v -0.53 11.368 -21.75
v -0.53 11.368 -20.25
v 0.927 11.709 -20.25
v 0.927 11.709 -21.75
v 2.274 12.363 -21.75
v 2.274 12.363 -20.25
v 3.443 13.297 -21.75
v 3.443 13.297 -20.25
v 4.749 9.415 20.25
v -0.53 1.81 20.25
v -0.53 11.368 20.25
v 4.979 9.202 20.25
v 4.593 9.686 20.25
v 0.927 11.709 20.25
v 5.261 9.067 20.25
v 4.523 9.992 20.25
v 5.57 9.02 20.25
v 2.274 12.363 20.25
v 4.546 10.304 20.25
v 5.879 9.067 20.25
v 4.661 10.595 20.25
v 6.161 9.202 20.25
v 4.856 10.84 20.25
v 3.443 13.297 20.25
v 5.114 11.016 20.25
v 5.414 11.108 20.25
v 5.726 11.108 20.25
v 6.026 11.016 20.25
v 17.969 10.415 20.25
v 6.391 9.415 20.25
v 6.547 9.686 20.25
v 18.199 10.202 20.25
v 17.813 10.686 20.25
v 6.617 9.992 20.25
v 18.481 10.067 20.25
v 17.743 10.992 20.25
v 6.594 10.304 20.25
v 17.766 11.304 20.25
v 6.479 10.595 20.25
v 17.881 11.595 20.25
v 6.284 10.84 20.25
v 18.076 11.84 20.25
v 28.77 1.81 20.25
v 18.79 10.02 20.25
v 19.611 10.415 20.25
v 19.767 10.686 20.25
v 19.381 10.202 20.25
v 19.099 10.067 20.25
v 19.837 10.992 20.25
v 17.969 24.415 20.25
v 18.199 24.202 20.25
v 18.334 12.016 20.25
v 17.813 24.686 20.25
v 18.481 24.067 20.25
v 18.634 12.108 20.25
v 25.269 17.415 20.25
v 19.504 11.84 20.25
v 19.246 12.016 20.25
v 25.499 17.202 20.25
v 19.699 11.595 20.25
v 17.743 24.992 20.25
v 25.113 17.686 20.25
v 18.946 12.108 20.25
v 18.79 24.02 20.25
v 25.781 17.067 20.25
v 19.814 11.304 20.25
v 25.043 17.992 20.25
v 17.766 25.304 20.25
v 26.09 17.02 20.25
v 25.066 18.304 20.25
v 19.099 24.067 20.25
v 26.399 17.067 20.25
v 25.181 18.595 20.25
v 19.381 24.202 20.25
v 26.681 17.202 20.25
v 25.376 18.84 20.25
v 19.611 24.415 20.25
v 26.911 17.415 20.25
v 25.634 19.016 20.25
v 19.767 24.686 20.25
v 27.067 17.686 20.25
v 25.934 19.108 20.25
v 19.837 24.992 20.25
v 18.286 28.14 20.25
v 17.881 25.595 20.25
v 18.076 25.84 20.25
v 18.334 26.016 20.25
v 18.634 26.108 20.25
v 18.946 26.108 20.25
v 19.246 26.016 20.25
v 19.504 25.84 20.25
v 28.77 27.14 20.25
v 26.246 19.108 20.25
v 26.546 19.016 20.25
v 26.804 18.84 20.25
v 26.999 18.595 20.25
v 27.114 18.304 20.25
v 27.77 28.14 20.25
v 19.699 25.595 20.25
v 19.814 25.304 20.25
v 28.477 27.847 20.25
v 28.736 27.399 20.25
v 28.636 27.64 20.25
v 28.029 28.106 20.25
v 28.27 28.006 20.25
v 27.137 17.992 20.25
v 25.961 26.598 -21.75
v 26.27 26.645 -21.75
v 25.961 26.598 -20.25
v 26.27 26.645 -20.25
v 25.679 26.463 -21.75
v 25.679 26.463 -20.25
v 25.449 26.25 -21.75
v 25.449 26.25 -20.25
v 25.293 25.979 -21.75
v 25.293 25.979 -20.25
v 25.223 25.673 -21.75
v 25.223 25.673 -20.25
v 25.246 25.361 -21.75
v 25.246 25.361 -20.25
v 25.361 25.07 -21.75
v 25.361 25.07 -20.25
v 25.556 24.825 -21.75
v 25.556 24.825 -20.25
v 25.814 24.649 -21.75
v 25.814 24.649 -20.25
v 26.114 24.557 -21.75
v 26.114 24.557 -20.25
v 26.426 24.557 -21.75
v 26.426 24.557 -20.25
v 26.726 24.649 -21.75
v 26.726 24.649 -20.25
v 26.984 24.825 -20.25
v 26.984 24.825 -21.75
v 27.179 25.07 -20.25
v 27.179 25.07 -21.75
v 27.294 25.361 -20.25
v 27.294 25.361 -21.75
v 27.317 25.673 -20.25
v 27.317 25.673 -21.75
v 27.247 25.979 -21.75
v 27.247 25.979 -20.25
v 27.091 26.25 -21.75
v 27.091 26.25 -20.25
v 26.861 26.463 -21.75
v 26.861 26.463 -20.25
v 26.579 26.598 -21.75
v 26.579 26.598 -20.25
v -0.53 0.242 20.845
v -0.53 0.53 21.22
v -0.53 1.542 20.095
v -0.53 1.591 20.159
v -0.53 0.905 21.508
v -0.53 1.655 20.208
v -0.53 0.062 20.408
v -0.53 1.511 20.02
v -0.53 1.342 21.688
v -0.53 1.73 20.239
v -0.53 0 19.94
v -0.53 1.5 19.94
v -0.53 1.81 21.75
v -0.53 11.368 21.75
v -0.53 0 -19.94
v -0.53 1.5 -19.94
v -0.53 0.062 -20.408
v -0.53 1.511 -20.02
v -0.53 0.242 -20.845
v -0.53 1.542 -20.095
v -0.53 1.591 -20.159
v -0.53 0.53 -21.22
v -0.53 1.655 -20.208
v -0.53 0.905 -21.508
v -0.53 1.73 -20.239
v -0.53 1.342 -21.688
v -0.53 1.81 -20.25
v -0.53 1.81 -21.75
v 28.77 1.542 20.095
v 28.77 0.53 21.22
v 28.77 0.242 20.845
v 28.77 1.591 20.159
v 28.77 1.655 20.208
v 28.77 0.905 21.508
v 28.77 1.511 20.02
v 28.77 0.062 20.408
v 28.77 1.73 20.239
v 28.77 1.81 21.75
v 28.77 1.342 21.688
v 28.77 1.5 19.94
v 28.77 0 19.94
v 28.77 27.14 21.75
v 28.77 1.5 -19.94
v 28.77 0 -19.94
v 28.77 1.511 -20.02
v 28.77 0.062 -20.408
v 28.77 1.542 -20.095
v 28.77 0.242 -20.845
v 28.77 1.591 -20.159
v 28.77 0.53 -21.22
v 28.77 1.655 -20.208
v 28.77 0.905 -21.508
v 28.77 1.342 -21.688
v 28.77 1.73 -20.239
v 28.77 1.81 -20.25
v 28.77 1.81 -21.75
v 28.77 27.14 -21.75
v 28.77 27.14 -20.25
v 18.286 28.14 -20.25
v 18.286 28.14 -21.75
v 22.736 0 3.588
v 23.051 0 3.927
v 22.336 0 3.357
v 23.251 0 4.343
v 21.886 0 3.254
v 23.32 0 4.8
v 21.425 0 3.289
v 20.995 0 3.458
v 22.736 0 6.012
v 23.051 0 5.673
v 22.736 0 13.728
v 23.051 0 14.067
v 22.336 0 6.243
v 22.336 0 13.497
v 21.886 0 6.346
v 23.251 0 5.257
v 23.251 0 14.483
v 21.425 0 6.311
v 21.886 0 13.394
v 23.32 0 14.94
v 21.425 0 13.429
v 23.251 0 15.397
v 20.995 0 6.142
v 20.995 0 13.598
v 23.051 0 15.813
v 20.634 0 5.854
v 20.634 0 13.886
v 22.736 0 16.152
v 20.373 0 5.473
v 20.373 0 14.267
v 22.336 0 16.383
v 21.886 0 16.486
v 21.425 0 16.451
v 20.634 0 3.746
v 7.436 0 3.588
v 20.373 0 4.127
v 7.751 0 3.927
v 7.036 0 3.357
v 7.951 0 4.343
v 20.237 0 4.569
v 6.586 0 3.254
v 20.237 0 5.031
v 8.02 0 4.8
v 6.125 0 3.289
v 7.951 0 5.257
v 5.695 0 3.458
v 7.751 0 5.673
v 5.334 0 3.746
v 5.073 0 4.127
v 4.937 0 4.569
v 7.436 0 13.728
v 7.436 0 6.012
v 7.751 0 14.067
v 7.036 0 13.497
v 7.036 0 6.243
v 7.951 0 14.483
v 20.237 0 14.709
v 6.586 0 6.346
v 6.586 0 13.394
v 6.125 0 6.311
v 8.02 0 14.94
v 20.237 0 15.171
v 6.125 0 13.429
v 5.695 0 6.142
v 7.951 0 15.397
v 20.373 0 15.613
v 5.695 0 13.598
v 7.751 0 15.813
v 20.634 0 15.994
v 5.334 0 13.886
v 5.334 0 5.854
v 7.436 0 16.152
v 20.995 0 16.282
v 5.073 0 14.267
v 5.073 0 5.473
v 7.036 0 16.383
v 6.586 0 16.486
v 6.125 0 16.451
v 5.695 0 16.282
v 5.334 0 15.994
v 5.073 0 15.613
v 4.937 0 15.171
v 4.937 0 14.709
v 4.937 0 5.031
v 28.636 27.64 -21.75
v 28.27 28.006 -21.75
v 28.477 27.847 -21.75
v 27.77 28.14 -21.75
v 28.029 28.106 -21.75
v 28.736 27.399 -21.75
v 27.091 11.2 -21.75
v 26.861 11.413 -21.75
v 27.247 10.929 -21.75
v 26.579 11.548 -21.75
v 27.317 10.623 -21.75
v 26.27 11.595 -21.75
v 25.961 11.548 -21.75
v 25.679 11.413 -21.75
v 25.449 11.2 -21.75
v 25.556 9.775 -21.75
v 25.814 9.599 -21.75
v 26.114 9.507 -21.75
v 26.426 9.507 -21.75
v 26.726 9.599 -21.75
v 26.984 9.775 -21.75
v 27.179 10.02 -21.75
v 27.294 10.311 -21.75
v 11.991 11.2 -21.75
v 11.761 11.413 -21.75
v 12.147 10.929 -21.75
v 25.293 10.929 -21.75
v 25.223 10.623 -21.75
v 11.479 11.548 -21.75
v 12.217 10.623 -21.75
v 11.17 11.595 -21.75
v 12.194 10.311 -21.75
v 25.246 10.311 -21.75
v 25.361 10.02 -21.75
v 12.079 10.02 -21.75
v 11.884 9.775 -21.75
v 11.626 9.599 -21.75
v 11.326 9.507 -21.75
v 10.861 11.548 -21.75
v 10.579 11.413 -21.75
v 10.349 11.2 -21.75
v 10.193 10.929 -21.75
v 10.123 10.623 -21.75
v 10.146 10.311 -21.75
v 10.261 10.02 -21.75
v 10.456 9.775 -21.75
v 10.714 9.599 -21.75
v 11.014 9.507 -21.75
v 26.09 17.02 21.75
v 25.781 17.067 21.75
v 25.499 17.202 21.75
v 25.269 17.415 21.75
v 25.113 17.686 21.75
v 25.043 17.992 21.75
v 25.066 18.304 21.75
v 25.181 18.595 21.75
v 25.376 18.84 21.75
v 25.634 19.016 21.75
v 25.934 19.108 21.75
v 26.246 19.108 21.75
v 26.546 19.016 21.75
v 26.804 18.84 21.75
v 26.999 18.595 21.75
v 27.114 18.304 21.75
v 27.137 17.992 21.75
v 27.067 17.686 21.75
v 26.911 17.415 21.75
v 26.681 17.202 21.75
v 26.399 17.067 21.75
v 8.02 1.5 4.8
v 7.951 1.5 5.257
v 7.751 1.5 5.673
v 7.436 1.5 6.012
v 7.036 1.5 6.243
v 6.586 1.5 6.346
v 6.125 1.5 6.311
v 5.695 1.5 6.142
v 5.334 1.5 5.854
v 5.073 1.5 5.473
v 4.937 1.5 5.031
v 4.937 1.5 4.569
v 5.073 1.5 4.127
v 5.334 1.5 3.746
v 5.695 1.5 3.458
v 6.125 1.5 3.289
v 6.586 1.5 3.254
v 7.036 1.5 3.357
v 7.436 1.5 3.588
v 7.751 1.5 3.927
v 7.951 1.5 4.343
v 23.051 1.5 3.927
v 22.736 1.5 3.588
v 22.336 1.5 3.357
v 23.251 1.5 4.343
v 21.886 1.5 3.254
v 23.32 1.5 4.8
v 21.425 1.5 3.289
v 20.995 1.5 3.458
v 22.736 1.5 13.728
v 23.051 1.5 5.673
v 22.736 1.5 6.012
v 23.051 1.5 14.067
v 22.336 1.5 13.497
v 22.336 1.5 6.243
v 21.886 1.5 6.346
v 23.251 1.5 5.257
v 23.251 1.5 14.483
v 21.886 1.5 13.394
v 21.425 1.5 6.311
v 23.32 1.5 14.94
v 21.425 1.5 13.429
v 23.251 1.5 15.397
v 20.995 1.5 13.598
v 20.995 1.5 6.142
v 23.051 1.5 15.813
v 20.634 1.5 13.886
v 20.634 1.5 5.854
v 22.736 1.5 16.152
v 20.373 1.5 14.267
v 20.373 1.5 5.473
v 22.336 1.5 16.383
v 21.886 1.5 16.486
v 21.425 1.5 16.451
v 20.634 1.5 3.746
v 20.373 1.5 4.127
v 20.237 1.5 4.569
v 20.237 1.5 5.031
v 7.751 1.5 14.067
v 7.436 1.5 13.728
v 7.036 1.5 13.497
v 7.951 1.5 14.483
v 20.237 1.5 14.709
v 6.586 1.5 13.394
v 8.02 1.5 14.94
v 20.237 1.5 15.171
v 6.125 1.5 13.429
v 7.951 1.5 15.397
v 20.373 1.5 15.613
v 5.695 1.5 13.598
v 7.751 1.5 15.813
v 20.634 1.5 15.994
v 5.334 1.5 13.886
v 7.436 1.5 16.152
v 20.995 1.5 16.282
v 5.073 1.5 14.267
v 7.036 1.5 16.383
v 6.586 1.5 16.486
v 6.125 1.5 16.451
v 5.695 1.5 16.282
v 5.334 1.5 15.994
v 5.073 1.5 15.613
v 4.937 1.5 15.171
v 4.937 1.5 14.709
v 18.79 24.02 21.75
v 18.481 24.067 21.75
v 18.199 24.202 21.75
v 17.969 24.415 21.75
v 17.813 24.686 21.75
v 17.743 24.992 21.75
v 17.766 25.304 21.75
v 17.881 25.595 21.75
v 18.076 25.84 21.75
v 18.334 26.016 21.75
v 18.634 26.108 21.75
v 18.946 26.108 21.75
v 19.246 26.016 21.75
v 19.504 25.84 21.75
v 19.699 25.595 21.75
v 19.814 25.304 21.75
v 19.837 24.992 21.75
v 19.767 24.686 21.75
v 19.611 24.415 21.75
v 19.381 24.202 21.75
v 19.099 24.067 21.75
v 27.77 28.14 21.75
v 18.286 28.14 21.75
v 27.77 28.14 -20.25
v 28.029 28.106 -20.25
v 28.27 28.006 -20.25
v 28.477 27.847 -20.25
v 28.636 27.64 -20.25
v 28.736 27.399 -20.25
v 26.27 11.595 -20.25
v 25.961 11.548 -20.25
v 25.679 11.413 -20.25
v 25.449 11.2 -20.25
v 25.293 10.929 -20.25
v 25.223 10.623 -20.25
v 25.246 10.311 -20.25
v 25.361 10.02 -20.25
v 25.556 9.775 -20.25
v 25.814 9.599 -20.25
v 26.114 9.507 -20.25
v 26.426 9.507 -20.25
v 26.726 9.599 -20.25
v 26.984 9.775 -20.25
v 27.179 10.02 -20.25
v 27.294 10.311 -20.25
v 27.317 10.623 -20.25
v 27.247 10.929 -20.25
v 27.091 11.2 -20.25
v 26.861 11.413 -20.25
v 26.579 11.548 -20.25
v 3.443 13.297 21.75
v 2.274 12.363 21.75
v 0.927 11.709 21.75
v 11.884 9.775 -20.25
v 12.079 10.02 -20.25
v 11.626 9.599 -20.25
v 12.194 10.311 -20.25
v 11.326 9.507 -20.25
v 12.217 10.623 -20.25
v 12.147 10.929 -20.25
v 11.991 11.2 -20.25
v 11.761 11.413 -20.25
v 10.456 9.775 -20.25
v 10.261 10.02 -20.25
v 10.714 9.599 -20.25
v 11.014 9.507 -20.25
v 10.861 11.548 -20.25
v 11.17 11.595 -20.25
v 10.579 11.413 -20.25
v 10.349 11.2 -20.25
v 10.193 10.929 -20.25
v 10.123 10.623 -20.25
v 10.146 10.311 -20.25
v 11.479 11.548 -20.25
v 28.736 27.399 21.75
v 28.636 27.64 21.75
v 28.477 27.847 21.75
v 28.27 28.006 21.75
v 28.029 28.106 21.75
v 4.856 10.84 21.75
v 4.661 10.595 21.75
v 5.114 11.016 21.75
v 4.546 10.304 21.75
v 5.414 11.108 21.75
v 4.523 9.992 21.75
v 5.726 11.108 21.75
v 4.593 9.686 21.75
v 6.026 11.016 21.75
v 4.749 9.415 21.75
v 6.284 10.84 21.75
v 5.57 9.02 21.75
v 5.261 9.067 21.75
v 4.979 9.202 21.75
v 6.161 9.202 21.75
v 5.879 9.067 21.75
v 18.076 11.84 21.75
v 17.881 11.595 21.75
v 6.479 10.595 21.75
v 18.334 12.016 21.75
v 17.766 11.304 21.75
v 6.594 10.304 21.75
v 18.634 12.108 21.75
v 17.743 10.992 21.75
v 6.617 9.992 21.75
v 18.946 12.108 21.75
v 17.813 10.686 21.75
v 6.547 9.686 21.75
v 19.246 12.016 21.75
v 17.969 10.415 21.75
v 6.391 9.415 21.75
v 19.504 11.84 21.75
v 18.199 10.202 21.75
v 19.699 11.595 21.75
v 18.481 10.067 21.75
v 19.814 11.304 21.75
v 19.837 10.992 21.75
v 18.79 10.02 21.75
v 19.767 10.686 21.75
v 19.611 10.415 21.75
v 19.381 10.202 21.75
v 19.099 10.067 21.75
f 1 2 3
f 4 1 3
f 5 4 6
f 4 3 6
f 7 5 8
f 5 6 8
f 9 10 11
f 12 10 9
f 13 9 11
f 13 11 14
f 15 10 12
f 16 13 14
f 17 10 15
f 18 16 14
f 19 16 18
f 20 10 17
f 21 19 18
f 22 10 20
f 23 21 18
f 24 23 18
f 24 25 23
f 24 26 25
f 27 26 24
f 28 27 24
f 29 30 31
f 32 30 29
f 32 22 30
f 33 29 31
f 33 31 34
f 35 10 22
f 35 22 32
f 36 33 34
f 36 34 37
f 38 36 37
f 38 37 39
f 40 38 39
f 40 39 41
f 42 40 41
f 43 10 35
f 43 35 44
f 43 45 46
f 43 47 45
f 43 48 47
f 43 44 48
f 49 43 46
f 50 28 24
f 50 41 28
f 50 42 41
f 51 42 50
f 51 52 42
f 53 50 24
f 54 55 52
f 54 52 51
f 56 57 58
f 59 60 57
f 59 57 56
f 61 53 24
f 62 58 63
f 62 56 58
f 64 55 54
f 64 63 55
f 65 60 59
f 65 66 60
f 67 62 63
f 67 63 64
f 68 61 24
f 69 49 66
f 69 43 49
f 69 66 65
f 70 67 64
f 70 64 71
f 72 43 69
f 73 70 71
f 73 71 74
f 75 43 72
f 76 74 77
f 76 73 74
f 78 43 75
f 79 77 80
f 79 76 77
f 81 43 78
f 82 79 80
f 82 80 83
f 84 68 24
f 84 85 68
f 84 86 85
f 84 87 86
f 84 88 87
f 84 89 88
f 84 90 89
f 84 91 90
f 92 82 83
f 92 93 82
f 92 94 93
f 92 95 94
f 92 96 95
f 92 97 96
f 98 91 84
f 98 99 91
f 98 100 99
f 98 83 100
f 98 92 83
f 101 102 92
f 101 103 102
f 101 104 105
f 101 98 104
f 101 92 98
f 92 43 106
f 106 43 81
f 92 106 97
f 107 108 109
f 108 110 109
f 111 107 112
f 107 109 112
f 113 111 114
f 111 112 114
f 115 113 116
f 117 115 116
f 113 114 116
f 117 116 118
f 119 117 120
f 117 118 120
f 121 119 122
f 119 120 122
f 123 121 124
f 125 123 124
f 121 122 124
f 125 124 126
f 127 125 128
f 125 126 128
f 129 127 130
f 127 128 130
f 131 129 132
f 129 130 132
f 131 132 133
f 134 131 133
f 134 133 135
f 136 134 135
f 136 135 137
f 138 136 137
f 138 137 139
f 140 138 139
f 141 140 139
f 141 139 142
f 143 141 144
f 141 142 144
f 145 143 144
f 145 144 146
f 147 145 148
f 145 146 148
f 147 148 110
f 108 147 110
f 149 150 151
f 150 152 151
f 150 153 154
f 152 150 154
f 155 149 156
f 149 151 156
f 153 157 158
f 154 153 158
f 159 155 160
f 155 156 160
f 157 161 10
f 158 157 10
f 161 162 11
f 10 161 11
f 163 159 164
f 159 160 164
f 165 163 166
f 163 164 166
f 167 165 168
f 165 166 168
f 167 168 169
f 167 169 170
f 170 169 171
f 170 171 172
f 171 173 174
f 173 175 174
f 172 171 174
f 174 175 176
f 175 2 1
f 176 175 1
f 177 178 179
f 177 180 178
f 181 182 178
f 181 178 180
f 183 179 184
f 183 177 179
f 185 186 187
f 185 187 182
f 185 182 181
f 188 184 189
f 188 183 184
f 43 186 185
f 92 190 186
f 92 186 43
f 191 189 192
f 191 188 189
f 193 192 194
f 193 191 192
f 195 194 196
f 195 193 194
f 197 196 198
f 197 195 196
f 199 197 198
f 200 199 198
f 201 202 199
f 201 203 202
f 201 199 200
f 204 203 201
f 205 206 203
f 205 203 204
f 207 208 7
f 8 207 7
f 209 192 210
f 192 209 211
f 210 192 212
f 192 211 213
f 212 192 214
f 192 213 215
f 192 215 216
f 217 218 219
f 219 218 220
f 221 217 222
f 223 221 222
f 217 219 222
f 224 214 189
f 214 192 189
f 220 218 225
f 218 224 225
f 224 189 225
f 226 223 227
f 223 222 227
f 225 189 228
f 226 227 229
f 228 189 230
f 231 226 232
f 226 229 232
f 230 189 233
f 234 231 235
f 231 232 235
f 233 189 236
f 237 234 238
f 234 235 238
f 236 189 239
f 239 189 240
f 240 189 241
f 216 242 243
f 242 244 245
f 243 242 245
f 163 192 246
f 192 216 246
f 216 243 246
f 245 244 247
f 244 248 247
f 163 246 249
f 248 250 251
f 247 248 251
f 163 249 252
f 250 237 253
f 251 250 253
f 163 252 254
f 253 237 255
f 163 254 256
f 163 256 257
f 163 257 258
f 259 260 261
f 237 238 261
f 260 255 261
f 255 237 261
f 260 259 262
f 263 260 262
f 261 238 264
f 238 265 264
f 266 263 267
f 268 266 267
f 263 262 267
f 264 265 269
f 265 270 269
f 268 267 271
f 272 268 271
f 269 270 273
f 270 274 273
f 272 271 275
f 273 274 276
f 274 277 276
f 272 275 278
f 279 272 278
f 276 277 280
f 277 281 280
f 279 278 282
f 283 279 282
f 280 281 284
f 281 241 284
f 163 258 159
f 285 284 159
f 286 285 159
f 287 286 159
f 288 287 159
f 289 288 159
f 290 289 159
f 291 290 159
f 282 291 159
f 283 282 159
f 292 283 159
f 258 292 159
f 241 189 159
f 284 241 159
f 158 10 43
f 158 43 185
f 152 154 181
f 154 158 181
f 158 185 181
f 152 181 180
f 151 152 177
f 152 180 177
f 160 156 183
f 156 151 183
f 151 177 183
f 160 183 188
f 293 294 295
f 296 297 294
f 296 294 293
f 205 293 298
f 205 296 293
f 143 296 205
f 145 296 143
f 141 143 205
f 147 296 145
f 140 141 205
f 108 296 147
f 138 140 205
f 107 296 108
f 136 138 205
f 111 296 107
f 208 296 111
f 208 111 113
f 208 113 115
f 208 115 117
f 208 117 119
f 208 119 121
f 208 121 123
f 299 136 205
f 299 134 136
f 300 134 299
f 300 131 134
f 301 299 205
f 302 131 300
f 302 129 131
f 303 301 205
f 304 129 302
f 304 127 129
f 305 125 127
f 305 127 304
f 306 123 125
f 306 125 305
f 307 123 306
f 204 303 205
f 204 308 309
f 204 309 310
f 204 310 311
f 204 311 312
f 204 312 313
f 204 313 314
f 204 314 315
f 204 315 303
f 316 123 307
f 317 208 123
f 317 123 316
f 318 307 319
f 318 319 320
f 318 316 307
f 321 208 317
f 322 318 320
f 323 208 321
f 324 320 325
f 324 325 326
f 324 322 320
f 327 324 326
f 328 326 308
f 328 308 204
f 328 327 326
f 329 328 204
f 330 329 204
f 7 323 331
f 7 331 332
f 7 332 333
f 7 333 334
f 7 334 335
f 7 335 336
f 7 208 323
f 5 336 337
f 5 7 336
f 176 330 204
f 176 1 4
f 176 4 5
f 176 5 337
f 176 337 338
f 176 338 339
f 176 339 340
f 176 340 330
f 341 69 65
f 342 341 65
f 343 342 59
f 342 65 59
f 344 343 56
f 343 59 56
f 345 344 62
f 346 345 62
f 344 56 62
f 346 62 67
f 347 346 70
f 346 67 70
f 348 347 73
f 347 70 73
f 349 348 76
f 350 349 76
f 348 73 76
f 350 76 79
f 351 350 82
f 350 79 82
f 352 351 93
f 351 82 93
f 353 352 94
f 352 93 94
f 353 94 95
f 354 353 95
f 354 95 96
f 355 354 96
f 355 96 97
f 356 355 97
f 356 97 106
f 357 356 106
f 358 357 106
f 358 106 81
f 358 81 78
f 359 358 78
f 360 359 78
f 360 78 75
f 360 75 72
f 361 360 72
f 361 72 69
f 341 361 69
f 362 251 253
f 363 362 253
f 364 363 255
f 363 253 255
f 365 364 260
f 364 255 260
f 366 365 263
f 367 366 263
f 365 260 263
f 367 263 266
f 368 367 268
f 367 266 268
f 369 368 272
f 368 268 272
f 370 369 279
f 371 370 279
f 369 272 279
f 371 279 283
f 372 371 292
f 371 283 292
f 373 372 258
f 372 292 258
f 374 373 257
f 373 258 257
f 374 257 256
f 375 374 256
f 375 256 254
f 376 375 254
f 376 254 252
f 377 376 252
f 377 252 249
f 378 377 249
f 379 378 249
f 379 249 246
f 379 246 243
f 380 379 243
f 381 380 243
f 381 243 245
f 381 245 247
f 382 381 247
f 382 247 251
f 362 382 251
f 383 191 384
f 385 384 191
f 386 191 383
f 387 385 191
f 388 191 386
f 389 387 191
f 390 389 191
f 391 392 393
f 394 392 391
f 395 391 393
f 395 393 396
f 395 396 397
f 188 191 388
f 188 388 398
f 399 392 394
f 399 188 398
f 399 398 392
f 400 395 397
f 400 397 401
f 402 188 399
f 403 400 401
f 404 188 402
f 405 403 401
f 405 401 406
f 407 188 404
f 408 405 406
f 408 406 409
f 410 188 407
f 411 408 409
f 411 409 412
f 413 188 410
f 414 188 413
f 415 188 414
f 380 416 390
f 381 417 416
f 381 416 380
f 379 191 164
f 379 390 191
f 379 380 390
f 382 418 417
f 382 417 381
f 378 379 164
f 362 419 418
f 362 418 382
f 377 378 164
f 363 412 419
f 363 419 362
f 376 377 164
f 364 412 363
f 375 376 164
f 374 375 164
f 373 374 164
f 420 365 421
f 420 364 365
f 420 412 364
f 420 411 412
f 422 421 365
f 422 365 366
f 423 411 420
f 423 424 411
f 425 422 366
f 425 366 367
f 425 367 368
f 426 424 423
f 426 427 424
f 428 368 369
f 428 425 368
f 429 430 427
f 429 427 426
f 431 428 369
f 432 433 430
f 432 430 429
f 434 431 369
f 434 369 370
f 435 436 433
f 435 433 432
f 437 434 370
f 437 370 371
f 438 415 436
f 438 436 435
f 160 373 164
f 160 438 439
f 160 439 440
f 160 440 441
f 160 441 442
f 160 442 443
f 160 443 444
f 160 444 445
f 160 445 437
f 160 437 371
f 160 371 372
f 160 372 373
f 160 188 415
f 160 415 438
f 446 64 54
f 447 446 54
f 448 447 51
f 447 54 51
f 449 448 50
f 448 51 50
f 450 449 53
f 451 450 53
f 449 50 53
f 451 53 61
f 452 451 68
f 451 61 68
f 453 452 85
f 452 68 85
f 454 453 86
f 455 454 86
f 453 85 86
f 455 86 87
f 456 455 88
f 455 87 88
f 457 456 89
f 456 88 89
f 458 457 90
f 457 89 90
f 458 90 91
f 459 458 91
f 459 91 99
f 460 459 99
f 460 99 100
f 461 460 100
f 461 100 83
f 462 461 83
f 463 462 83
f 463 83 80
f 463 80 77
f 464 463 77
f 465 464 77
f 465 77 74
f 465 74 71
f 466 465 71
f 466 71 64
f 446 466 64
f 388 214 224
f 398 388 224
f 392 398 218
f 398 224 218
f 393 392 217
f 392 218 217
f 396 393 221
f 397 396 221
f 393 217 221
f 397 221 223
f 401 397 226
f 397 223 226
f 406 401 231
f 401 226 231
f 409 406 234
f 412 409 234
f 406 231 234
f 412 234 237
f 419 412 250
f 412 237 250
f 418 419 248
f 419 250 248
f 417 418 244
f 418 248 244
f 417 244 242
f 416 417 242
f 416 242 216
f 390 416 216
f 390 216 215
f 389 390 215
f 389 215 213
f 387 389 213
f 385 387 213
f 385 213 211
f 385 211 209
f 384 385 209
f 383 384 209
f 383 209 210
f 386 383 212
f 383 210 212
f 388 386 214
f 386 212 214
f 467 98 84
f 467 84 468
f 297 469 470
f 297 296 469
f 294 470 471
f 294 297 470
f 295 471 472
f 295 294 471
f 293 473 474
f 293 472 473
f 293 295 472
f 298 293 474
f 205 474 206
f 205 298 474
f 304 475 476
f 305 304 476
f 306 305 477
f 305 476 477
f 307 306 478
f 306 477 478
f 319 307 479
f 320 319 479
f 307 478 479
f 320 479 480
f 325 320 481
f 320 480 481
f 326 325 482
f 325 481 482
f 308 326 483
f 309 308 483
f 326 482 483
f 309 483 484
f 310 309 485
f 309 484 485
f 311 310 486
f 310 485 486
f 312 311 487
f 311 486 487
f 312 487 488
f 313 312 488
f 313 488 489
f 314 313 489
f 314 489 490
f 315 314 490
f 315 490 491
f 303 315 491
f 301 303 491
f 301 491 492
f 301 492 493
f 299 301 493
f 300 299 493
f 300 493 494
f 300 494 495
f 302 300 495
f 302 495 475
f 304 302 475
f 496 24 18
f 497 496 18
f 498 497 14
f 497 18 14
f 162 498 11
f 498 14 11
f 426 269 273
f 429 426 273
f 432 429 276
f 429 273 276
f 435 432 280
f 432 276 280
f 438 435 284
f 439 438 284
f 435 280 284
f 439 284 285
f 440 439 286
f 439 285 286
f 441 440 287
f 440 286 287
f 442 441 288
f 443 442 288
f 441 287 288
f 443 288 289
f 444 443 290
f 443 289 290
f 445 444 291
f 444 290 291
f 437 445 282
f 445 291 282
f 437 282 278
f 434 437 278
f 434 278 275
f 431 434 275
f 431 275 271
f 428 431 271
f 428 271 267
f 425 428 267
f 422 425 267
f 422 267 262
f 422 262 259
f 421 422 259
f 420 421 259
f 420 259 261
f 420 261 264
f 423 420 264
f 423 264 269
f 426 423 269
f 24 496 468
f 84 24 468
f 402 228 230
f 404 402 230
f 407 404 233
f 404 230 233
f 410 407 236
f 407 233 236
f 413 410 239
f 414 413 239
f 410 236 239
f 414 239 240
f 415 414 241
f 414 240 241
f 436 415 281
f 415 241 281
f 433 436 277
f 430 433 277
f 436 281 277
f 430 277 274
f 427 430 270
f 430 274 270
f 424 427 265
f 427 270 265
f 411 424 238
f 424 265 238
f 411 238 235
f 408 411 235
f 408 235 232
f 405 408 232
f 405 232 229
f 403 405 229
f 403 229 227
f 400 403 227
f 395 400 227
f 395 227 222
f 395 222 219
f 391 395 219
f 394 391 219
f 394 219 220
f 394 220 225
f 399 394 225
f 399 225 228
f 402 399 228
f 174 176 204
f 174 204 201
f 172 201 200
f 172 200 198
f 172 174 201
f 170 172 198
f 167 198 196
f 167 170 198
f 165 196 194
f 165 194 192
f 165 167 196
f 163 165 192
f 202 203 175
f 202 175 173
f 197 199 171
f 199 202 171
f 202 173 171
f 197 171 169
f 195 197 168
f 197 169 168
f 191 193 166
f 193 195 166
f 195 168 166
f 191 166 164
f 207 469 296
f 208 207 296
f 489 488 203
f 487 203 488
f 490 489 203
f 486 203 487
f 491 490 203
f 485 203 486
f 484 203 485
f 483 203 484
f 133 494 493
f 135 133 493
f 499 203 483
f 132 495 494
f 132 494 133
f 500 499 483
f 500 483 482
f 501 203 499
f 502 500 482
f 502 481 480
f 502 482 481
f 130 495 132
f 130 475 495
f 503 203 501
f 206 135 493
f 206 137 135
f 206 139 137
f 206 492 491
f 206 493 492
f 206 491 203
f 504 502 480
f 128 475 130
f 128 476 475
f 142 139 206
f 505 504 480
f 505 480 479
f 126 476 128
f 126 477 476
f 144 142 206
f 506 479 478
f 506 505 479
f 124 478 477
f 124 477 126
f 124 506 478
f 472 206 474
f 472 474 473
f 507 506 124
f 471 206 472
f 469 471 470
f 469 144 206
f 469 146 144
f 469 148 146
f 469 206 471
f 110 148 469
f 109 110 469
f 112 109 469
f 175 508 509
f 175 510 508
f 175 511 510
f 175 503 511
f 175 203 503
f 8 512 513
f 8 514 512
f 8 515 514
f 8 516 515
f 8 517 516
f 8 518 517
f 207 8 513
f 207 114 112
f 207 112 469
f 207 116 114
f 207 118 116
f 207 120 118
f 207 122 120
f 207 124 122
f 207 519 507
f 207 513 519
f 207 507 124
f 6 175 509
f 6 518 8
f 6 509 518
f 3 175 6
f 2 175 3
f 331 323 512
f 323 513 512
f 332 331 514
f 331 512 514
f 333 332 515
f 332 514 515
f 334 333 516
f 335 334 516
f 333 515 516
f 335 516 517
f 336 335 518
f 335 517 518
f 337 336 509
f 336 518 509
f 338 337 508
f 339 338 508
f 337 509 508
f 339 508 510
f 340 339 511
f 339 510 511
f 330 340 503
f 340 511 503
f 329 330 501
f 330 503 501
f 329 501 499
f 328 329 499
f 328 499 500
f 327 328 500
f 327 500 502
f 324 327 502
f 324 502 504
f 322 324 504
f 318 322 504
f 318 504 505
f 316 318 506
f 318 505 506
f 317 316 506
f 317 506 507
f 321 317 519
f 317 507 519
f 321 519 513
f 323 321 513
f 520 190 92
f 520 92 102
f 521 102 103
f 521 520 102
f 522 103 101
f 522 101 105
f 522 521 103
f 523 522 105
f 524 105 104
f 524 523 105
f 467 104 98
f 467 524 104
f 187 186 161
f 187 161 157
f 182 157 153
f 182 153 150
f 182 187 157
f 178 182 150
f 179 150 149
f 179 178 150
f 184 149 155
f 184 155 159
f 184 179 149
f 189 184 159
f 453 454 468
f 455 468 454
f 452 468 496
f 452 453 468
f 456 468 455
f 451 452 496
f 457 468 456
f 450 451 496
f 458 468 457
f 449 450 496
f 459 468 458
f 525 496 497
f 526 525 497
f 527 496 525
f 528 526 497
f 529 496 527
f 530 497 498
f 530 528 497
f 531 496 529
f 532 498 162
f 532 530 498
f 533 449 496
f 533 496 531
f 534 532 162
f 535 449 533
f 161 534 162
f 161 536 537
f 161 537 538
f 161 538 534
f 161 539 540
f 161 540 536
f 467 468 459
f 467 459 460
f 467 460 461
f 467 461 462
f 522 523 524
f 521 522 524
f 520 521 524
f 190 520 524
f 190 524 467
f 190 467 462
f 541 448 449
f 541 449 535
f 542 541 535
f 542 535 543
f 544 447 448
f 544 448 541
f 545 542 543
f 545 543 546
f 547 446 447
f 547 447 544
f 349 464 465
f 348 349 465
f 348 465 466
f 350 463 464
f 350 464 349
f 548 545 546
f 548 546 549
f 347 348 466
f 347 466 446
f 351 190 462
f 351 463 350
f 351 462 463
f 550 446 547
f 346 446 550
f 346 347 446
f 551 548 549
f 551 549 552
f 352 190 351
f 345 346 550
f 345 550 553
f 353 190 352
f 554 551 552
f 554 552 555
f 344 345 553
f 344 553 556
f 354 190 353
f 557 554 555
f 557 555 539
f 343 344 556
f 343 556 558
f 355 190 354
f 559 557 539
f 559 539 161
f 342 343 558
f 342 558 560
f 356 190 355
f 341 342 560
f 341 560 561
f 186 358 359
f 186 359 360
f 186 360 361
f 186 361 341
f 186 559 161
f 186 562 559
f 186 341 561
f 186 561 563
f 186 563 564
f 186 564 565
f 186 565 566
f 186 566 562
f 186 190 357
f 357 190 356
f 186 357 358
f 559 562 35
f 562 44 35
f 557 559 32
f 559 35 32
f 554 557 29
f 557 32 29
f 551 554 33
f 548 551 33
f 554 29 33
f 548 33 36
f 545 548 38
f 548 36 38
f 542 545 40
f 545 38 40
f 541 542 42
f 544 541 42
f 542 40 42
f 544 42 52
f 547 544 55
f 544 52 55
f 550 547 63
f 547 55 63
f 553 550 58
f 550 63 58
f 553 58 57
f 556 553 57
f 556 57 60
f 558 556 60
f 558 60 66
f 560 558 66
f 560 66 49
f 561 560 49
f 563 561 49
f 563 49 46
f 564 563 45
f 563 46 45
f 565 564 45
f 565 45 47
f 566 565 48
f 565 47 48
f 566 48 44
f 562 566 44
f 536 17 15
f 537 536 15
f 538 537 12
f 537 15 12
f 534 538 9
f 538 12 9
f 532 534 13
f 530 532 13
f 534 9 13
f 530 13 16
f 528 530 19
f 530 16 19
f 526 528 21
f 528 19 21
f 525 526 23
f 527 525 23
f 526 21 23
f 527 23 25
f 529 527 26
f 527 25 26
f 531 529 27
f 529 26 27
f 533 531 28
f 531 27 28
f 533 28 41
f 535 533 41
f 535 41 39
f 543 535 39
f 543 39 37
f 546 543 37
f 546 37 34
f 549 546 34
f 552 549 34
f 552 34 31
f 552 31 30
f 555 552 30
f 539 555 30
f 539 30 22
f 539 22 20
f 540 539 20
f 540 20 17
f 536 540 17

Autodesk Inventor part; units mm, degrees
ref_plane "YZ Plane" through (0, 0, 0) normal (1, 0, 0) x (0, 1, 0)
ref_plane "XZ Plane" through (0, 0, 0) normal (0, 1, 0) x (-1, 0, 0)
ref_plane "XY Plane" through (0, 0, 0) normal (0, 0, 1) x (1, 0, 0)
sketch "Sketch1" plane through (0, 0, 0) normal (0, 1, 0) x (-1, 0, 0)
  line L0 (0.53, 20.25) -> (-28.77, 20.25)
  line L1 (-28.77, 20.25) -> (-28.77, -20.25)
  line L2 (-28.77, -20.25) -> (0.53, -20.25)
  line L3 (0.53, -20.25) -> (0.53, 20.25)
  point P0 (0, 0)
  dimension "d0" = 40.5
  dimension "d1" = 29.3
  dimension "d2" = -0.53
  dimension "d3" = 20.25
extrude "Plate1" add sketch "Sketch1" along normal blind 1.5
sketch "Sketch2" plane through (28.77, 0, 21.75) normal (0, 0, -1) x (-1, 0, 0)
  line L0 (29.3, 0) -> (0, 0)
  line L1 (0, 0) -> (0, 28.14)
  line L2 (0, 28.14) -> (29.3, 28.14)
  line L3 (29.3, 28.14) -> (29.3, 0)
edge flange "Flange1" height 28.14 angle 90 thickness 1.5 bend radius 0.31 thickness toward (0, 0, -1) relief tear relief width 1.5 relief depth 0.75 corner gap 0.31 corner form 0 edges at (14.12, 1.5, 20.25) (14.12, 1.5, -20.25) wall of the first edge with corners at (-0.53, 0, 21.75) (28.77, 0, 21.75) (28.77, 28.14, 21.75) (-0.53, 28.14, 21.75)
bend "Bend1"
corner "Corner1"
sketch "Sketch6" plane through (-0.53, 28.14, 21.75) normal (0, 0, 1) x (1, 0, 0)
  point P0 (0.53, -28.14)
sketch "Sketch8" plane through (28.77, 28.14, -21.75) normal (0, 0, -1) x (-1, 0, 0)
  circle A0 centre (2.5, -2.545) radius 0.7835
  circle A1 centre (2.5, -17.595) radius 0.7835
  circle A2 centre (17.6, -2.545) radius 0.7835
  circle A3 centre (17.6, -17.595) radius 0.7835
  circle A4 centre (37.6, -2.545) radius 0.7835
  circle A5 centre (37.6, -17.595) radius 0.7835
  point P0 (28.77, -28.14)
hole "Hole4" at (26.27, 25.595, -21.75) at (26.27, 10.545, -21.75) at (11.17, 25.595, -21.75) at (11.17, 10.545, -21.75) at (-8.83, 25.595, -21.75) at (-8.83, 10.545, -21.75) direction (0, 0, 1) diameter 2.1 depth 1.5
sketch "Sketch9" plane through (28.77, 28.14, -21.75) normal (0, 0, -1) x (-1, 0, 0)
  circle A0 centre (30.1, -10.07) radius 6
  point P0 (28.77, -28.14)
sketch "Sketch10" plane through (-0.53, 28.14, 21.75) normal (0, 0, 1) x (1, 0, 0)
  point P0 (0.53, -28.14)
sketch "Sketch11" plane through (-0.53, 28.14, 21.75) normal (0, 0, 1) x (1, 0, 0)
  point P0 (0.53, -28.14)
sketch "Sketch15" plane through (0, 0, 0) normal (0, -1, 0) x (1, 0, 0)
  point P0 (0, 0)
sketch "Sketch16" plane through (0, 0, 0) normal (0, -1, 0) x (1, 0, 0)
  circle A0 centre (6.47, 14.94) radius 1.55
  line L0 (28.77, 19.94) -> (-0.53, 19.94) projected
  line L1 (-0.53, -19.94) -> (-0.53, 19.94) projected
  circle A1 centre (21.77, 14.94) radius 1.55
  line L2 (28.77, 19.94) -> (28.77, -19.94) projected
  circle A2 centre (6.47, 4.8) radius 1.55
  circle A3 centre (21.77, 4.8) radius 1.55
  point P0 (0, 0)
  dimension "d65" = 3.1
  dimension "d66" = 5
  dimension "d67" = 7
  dimension "d68" = 3.1
  dimension "d69" = 5
  dimension "d70" = 7
  dimension "d71" = 3.1
  dimension "d72" = 15.14
  dimension "d73" = 7
  dimension "d74" = 3.1
  dimension "d75" = 15.14
  dimension "d76" = 7
extrude "Cut6" cut sketch "Sketch16" against normal blind 1.5
sketch "Sketch18" plane through (-0.53, 28.14, 21.75) normal (0, 0, 1) x (1, 0, 0)
  circle A0 centre (-0.8, -10.07) radius 6
  point P0 (0.53, -28.14)
fillet "Corner Round1" radius 1 4 edges at (-0.53, 28.14, -21) (28.77, 28.14, -21) (28.77, 28.14, 21) (-0.53, 28.14, 21)
sketch "Sketch19" plane through (-0.53, 1.81, 21.75) normal (0, 0, 1) x (1, 0, 0)
  circle A0 centre (6.1, 24.26) radius 0.7835
  circle A1 centre (19.32, 23.26) radius 0.7835
  circle A2 centre (26.62, 16.26) radius 0.7835
  circle A3 centre (19.32, 9.26) radius 0.7835
  circle A4 centre (6.1, 8.26) radius 0.7835
  point P0 (0.53, -1.81)
hole "Hole6" at (5.57, 26.07, 21.75) at (18.79, 25.07, 21.75) at (26.09, 18.07, 21.75) at (18.79, 11.07, 21.75) at (5.57, 10.07, 21.75) direction (0, 0, -1) diameter 2.1 depth 1.5
hole "Hole7" at (-1.33, 18.07, 21.75) direction (0, 0, -1) diameter 13.5 depth 1.5
hole "Hole8" at (-1.33, 18.07, -21.75) direction (0, 0, 1) diameter 13.5 depth 1.5
sketch "Sketch20" plane through (-0.53, 1.81, 21.75) normal (0, 0, 1) x (1, 0, 0)
  arc A0 (0, 9.5576) -> (0, 22.9624) centre (-0.8, 16.26) ccw projected
  line L0 (3.973, 11.487) -> (18.8159, 26.33)
  line L1 (1, 26.33) -> (28.3, 26.33) projected
  arc A1 (1, 26.33) -> (0, 25.33) centre (1, 25.33) ccw projected
  line L2 (0, 22.9624) -> (0, 25.33) projected
  line L3 (18.8159, 26.33) -> (1, 26.33)
  arc A2 (1, 26.33) -> (0, 25.33) centre (1, 25.33) ccw
  line L4 (0, 25.33) -> (0, 22.9624)
  arc A3 (3.973, 11.487) -> (0, 22.9624) centre (-0.8, 16.26) ccw
  point P0 (0.53, -1.81)
  dimension "d110" = 45
  dimension "d111" = 0
extrude "Cut8" cut sketch "Sketch20" against normal blind 1.5
mirror "Mirror1" about plane through (0, 0, 0) normal (0, 0, 1) of "Cut8"
equation "\"d55\" = Thickness"
equation "\"d77\" = Thickness"
equation "\"d94\" = Thickness"
equation "\"d101\" = Thickness"
equation "\"d108\" = Thickness"
equation "\"d112\" = Thickness"
equation "\"d4\" = Thickness"
equation "\"d5\" = BendReliefWidth"
equation "\"d6\" = BendReliefDepth"
equation "\"d7\" = MinimumRemnant"
equation "\"d8\" = TransitionRadius"
equation "\"d11\" = BendRadius"
equation "\"d12\" = CornerReliefSize"
equation "\"d13\" = GapSize"
equation "\"d14\" = JacobiRadiusSize"
equation "\"BendReliefWidth\" = Thickness"
equation "\"BendReliefDepth\" = 0.5 * Thickness"
equation "\"CornerReliefSize\" = 4 * Thickness"
equation "\"MinimumRemnant\" = 2 * Thickness"
equation "\"TransitionRadius\" = BendRadius"
equation "\"JacobiRadiusSize\" = BendRadius"
equation "\"GapSize\" = Thickness"
equation "\"Thickness\" = 1.5"
equation "\"BendRadius\" = 0.31"
properties part number "axis_25_bottom_frame" material "Aluminum 6061-AHC"
